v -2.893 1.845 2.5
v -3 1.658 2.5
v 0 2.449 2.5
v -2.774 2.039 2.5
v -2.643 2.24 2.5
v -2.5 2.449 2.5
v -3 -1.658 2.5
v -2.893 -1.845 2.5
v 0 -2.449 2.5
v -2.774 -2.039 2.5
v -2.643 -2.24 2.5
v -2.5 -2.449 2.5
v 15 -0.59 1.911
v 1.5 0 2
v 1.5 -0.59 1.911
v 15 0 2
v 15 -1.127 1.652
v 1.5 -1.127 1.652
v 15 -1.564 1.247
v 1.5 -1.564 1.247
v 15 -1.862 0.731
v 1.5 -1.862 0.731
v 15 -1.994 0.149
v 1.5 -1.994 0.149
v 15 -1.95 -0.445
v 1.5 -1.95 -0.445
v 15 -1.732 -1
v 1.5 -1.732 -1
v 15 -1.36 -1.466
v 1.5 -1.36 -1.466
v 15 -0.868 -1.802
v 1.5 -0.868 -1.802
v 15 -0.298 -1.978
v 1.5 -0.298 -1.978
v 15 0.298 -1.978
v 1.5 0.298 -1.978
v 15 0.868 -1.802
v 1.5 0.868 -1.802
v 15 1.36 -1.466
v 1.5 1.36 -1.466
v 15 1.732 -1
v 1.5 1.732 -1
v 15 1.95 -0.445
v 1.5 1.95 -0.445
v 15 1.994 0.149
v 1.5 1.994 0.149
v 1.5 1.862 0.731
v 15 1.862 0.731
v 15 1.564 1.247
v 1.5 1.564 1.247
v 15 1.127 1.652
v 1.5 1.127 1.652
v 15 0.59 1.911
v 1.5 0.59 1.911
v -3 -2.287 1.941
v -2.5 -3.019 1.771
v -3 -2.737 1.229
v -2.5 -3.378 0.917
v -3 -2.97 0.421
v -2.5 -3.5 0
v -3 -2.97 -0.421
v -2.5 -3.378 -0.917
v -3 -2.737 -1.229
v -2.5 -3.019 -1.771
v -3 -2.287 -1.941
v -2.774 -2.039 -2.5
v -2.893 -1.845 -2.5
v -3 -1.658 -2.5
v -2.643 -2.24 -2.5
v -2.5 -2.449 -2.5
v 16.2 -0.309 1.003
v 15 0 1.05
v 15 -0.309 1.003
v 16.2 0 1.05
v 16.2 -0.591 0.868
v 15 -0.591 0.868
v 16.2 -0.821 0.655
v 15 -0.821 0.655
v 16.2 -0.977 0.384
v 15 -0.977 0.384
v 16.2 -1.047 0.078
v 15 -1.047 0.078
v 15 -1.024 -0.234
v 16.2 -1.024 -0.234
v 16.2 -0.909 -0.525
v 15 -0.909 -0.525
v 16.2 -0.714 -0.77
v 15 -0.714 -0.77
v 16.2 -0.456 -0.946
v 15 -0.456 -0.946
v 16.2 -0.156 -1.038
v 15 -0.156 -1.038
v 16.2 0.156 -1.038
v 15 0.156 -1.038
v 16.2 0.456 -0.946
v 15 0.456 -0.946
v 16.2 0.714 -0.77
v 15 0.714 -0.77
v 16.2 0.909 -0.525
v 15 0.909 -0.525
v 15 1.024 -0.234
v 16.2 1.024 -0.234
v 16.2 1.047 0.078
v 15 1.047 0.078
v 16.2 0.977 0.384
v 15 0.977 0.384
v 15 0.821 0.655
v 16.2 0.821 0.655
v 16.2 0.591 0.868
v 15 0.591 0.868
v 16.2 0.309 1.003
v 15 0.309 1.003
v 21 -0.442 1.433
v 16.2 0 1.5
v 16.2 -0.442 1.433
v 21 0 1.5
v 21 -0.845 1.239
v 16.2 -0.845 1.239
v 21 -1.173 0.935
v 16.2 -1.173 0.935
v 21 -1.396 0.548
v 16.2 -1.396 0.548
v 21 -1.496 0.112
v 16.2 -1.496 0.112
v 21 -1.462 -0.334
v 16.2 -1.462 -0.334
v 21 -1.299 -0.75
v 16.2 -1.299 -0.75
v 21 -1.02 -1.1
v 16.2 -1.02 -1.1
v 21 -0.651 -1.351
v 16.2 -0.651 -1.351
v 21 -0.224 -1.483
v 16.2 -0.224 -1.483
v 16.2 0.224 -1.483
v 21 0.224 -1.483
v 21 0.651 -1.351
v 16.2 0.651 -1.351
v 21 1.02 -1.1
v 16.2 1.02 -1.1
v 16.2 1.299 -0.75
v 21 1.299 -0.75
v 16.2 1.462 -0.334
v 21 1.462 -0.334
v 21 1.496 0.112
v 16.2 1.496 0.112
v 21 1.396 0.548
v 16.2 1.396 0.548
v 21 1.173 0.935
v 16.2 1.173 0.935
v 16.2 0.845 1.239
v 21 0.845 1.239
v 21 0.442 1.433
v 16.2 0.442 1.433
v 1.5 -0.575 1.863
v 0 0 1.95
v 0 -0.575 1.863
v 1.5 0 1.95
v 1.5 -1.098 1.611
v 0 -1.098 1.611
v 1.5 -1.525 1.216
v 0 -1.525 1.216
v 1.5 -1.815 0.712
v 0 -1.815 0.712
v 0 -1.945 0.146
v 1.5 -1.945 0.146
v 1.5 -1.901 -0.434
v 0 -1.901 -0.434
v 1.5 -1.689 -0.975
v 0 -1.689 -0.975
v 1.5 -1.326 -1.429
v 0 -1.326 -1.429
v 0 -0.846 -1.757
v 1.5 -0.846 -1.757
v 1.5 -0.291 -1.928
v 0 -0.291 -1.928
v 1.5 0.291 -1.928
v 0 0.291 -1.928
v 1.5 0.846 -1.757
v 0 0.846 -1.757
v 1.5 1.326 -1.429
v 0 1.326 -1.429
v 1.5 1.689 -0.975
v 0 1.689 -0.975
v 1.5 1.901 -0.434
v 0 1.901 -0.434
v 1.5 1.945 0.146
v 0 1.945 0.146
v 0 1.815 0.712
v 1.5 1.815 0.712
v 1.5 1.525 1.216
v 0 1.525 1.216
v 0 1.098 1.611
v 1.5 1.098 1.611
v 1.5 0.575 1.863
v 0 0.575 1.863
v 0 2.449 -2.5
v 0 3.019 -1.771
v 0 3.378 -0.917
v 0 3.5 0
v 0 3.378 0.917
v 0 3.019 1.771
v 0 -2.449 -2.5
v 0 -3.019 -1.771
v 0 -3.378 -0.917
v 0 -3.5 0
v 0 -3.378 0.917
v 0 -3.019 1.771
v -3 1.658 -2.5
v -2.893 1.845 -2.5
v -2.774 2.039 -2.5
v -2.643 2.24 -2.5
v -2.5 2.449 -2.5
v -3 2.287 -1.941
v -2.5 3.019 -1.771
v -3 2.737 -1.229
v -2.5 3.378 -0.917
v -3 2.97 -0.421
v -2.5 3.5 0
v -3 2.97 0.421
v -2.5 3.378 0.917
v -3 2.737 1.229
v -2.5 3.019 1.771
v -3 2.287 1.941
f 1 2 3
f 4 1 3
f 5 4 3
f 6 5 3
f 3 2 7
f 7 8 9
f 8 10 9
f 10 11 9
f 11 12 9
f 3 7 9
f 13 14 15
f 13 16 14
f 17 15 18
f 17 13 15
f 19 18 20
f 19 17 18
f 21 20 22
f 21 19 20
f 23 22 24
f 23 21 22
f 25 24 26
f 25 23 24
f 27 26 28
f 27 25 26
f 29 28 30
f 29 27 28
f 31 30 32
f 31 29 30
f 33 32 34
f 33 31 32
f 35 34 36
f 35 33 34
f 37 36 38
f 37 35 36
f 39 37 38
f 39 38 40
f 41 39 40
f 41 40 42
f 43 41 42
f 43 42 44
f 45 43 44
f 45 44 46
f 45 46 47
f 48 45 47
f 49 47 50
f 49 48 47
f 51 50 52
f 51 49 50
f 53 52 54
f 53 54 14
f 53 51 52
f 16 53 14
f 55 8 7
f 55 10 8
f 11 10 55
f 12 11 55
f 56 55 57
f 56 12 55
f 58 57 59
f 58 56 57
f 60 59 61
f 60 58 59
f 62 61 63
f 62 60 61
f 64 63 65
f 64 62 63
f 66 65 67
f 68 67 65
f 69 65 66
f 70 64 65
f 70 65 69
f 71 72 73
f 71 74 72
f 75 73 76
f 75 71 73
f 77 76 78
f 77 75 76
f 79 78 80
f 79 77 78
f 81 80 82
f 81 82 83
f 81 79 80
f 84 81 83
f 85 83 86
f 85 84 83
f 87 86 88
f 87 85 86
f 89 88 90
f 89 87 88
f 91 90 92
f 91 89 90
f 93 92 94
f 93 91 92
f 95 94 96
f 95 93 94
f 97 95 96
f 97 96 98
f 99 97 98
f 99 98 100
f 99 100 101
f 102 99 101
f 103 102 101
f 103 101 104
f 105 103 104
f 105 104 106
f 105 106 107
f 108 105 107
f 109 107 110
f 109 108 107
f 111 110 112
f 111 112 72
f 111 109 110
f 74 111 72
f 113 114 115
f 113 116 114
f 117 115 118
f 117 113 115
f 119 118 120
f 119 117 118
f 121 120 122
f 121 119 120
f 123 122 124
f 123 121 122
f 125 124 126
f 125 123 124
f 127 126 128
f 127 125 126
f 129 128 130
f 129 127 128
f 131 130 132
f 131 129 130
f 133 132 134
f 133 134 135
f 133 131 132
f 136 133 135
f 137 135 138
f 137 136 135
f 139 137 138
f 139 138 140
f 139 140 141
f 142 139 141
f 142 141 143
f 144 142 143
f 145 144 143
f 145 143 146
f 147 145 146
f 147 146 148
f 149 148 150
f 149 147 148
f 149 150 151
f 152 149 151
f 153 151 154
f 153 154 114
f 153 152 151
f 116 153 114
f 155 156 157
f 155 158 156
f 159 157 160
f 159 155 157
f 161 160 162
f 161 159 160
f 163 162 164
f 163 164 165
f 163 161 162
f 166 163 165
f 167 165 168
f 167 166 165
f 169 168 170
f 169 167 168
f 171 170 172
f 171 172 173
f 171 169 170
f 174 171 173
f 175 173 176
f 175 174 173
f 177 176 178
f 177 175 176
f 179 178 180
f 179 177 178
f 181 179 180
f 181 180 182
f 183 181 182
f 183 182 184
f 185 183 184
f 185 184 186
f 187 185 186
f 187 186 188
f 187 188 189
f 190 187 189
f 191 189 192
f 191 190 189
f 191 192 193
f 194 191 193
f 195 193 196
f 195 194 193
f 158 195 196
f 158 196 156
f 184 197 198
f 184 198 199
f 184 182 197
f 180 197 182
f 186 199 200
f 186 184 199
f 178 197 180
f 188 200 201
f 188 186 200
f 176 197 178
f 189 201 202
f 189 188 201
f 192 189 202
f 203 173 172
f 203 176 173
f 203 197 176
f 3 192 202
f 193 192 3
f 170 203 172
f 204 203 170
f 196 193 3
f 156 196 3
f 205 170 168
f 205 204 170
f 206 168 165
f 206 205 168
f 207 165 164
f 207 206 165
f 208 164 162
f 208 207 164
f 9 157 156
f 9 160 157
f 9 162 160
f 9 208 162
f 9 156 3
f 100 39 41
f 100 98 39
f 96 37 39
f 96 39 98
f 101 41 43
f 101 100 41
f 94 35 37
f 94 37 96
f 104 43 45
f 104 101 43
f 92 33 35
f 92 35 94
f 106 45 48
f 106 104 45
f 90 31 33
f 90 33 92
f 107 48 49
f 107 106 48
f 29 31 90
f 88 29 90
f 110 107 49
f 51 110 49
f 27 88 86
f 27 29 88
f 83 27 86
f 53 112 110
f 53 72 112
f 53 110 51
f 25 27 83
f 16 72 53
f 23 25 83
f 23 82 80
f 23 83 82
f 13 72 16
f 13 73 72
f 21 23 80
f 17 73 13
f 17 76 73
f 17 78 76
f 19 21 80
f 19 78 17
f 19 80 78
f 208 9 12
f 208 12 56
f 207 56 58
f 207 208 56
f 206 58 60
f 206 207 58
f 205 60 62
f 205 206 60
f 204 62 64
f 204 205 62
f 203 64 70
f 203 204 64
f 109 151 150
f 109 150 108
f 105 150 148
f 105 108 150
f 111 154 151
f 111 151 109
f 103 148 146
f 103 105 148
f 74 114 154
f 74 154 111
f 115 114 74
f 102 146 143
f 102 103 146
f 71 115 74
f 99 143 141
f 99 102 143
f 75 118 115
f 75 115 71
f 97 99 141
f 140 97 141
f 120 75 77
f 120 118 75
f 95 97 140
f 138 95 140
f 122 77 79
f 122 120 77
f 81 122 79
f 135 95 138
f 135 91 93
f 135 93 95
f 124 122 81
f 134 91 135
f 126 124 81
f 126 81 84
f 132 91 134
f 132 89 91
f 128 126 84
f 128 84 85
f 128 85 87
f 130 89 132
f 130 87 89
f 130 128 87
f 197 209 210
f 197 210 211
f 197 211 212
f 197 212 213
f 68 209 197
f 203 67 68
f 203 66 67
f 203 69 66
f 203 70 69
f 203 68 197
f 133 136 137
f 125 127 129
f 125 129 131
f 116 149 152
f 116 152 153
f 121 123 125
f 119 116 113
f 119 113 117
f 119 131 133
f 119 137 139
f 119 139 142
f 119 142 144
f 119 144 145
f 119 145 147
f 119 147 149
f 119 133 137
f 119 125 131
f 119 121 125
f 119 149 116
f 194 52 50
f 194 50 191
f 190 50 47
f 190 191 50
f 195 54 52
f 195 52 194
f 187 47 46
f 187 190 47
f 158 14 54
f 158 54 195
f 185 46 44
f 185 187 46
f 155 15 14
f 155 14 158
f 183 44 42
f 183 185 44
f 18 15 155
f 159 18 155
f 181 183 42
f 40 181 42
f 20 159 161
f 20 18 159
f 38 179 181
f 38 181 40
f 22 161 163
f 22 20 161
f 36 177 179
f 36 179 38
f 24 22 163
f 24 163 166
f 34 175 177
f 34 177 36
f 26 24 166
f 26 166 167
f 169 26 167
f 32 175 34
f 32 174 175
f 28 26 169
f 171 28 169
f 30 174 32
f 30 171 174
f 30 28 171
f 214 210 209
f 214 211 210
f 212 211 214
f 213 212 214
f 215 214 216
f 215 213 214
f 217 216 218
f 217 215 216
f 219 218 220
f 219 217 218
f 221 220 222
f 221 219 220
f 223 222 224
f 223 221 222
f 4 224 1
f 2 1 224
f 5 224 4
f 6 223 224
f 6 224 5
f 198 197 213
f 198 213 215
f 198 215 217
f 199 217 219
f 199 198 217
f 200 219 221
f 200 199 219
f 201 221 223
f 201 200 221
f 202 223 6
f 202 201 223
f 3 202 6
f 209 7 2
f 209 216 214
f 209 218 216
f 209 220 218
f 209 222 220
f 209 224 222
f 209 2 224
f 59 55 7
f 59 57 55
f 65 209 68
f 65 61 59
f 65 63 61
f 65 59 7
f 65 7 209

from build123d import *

# Parameters (mm, degrees)
CUT_EXTRUDE1_DEPTH      = 22.57544901
CUT_EXTRUDE1_DEPTH_BACK = 22.57544901
SKETCH2_W               = 3
SKETCH2_H               = 1
CHAMFER1_SIZE           = 0.5


with BuildPart() as part:
    # Sketch1 → Revolve1 (revolve)
    with BuildSketch(Plane.XY, mode=Mode.PRIVATE) as revolve1_sk:
        Polygon((-3, 0), (-3, 3.5), (0, 3.5), (0, 1.95), (1.5, 1.95), (1.5, 2), (15, 2), (15, 1.05), (16.2, 1.05), (16.2, 1.5), (21, 1.5), (21, 0), align=None)
    revolve(revolve1_sk.sketch.rotate(Axis((0, 0, 0), (1, 0, 0)), 90), axis=Axis((0, 0, 0), (1, 0, 0)))

    # Sketch2 → Cut-Extrude1 (cut, two sides: drawn at the far end of the back side and taken through both)
    with BuildSketch(Plane(origin=(0, 0, 0), x_dir=(1, 0, 0), z_dir=(0, 1, 0)).offset(-CUT_EXTRUDE1_DEPTH_BACK)):
        with Locations((-1.5, 3)):
            Rectangle(SKETCH2_W, SKETCH2_H)
        with Locations((-1.5, -3)):
            Rectangle(SKETCH2_W, SKETCH2_H)
    extrude(amount=CUT_EXTRUDE1_DEPTH + CUT_EXTRUDE1_DEPTH_BACK, mode=Mode.SUBTRACT)

    # Chamfer1
    chamfer1_edges = [part.edges().sort_by_distance(p)[0] for p in [
        (-3, -3.5, 0),
        (-3, 3.5, 0),
    ]]
    chamfer(chamfer1_edges, length=CHAMFER1_SIZE)


solid = part.part
